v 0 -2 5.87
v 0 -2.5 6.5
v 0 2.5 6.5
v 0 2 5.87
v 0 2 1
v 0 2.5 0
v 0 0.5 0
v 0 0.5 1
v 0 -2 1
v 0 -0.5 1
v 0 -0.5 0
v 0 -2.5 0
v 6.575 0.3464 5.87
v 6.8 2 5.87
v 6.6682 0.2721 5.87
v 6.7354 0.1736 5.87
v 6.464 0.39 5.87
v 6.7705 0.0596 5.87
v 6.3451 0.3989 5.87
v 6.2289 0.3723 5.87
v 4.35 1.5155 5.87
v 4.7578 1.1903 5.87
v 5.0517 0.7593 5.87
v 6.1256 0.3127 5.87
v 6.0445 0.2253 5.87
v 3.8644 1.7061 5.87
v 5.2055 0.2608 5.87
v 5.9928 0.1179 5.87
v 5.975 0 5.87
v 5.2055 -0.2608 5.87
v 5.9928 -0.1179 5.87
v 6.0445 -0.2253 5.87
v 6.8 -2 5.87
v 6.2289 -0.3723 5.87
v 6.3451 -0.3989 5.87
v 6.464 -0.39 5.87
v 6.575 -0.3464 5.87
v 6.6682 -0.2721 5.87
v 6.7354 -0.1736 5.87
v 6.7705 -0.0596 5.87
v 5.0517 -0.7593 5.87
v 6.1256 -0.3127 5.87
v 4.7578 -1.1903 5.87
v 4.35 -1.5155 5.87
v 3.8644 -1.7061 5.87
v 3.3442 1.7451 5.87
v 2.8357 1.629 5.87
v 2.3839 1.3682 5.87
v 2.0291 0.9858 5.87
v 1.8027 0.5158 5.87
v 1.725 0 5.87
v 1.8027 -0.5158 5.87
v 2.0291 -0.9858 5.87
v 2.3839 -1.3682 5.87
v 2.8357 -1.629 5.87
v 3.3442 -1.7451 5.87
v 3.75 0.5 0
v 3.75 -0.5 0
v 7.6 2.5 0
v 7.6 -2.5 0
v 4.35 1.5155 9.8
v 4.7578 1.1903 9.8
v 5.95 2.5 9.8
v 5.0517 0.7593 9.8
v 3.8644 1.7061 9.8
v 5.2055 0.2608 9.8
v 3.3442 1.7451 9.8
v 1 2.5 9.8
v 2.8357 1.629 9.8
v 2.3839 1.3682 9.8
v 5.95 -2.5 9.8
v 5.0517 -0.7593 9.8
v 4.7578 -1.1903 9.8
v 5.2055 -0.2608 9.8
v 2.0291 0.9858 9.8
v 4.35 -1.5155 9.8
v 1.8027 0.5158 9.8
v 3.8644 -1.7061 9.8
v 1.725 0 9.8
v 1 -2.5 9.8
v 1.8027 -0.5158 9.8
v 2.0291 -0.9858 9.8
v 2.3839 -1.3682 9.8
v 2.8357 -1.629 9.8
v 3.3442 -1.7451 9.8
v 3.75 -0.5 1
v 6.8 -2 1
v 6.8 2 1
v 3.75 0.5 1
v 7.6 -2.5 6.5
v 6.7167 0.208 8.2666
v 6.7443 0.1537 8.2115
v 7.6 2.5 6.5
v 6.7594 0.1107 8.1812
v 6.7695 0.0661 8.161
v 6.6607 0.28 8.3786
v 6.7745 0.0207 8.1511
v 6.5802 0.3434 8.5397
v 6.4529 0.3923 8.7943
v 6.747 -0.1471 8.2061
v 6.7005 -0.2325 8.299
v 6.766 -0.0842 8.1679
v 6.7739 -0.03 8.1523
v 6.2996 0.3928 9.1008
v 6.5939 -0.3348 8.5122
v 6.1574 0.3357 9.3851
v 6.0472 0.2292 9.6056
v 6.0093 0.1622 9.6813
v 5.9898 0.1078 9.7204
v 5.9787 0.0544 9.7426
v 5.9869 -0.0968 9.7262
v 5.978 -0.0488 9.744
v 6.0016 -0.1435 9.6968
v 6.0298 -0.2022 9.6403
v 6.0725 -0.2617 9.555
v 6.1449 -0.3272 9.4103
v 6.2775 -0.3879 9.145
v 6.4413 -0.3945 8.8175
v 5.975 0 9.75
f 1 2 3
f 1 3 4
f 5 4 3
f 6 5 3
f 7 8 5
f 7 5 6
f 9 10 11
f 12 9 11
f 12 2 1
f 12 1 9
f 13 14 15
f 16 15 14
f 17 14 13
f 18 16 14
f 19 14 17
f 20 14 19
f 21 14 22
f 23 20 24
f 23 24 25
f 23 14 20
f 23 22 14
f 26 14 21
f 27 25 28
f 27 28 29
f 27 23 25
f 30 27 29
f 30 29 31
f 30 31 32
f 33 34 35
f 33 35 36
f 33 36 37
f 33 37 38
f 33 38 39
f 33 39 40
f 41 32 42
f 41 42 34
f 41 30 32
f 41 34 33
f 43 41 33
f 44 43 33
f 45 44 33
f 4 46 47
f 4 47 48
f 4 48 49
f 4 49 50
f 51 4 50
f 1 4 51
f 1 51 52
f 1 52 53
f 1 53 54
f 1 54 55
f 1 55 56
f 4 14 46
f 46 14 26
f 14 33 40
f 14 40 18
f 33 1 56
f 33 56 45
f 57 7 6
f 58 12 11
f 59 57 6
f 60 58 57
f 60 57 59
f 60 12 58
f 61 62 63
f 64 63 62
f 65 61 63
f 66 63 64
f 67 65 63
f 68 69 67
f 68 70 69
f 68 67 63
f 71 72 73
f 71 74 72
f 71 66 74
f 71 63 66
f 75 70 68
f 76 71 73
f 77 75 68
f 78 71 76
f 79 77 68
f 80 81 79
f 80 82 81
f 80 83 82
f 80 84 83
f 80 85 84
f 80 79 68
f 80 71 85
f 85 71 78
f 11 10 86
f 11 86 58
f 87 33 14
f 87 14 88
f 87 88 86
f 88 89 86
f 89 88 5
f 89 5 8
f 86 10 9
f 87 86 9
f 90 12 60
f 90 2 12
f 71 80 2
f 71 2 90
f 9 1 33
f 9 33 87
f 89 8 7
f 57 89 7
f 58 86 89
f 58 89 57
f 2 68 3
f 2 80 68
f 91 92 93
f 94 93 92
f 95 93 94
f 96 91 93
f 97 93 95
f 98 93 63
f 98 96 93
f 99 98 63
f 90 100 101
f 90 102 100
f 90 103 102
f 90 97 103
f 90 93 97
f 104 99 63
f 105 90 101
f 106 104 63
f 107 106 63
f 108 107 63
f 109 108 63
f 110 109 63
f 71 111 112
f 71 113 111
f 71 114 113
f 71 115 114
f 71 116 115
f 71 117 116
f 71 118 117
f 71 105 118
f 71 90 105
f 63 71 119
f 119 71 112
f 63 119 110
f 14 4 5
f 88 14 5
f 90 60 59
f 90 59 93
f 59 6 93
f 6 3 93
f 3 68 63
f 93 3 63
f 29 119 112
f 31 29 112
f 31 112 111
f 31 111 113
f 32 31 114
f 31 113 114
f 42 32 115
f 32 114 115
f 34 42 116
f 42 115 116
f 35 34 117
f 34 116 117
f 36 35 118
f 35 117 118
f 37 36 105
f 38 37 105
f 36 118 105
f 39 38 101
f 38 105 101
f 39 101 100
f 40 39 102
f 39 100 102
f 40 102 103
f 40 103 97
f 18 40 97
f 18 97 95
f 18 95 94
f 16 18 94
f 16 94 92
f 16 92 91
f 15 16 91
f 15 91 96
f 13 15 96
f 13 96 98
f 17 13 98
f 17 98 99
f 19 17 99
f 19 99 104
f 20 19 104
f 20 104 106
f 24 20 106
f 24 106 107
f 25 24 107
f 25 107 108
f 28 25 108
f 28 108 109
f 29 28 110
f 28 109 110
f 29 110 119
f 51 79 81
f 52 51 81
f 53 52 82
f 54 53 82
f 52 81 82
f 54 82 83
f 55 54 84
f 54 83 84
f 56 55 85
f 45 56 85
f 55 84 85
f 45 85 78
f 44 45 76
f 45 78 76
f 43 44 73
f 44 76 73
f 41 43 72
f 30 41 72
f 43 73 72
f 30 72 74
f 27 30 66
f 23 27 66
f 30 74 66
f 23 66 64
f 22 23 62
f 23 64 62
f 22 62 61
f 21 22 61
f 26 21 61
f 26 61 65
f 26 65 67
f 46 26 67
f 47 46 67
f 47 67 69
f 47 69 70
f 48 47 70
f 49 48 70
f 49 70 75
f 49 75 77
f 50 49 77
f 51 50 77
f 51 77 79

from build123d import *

# Parameters (mm, degrees)
PAD001_DEPTH    = 2.5
SKETCH003_W     = 1
SKETCH003_H     = 1
POCKET_DEPTH    = 3.75
SKETCH004_W     = 4.87
SKETCH004_H     = 4
POCKET001_DEPTH = 6.8
SKETCH005_R     = 1.75
SKETCH005_R_2   = 0.4
POCKET002_DEPTH = 5


with BuildPart() as part:
    # Sketch002 → Pad001 (new body, symmetric)
    with BuildSketch(Plane.XZ):
        Polygon((0, 0), (7.6, 0), (7.6, 6.5), (5.95, 9.8), (1, 9.8), (0, 6.5), align=None)
    extrude(amount=PAD001_DEPTH, both=True)

    # Sketch003 (on Face6 of Pad001) → Pocket (cut)
    with BuildSketch(Plane(origin=(0, 0, 0), x_dir=(0, 0, -1), z_dir=(-1, 0, 0))):
        with Locations((-0.5, 0)):
            Rectangle(SKETCH003_W, SKETCH003_H)
    extrude(amount=-POCKET_DEPTH, mode=Mode.SUBTRACT)

    # Sketch004 (on Face5 of Pocket) → Pocket001 (cut)
    with BuildSketch(Plane(origin=(0, 0, 0), x_dir=(0, 0, -1), z_dir=(-1, 0, 0))):
        with Locations((-3.435, 0)):
            Rectangle(SKETCH004_W, SKETCH004_H)
    extrude(amount=-POCKET001_DEPTH, mode=Mode.SUBTRACT)

    # Sketch005 (on Face10 of Pocket001) → Pocket002 (cut)
    with BuildSketch(Plane(origin=(0, 0, 9.8), x_dir=(-1, 0, 0), z_dir=(0, 0, 1))):
        with Locations((-3.475, 0)):
            Circle(SKETCH005_R)
        with Locations((-6.375, 0)):
            Circle(SKETCH005_R_2)
    extrude(amount=-POCKET002_DEPTH, mode=Mode.SUBTRACT)


solid = part.part
